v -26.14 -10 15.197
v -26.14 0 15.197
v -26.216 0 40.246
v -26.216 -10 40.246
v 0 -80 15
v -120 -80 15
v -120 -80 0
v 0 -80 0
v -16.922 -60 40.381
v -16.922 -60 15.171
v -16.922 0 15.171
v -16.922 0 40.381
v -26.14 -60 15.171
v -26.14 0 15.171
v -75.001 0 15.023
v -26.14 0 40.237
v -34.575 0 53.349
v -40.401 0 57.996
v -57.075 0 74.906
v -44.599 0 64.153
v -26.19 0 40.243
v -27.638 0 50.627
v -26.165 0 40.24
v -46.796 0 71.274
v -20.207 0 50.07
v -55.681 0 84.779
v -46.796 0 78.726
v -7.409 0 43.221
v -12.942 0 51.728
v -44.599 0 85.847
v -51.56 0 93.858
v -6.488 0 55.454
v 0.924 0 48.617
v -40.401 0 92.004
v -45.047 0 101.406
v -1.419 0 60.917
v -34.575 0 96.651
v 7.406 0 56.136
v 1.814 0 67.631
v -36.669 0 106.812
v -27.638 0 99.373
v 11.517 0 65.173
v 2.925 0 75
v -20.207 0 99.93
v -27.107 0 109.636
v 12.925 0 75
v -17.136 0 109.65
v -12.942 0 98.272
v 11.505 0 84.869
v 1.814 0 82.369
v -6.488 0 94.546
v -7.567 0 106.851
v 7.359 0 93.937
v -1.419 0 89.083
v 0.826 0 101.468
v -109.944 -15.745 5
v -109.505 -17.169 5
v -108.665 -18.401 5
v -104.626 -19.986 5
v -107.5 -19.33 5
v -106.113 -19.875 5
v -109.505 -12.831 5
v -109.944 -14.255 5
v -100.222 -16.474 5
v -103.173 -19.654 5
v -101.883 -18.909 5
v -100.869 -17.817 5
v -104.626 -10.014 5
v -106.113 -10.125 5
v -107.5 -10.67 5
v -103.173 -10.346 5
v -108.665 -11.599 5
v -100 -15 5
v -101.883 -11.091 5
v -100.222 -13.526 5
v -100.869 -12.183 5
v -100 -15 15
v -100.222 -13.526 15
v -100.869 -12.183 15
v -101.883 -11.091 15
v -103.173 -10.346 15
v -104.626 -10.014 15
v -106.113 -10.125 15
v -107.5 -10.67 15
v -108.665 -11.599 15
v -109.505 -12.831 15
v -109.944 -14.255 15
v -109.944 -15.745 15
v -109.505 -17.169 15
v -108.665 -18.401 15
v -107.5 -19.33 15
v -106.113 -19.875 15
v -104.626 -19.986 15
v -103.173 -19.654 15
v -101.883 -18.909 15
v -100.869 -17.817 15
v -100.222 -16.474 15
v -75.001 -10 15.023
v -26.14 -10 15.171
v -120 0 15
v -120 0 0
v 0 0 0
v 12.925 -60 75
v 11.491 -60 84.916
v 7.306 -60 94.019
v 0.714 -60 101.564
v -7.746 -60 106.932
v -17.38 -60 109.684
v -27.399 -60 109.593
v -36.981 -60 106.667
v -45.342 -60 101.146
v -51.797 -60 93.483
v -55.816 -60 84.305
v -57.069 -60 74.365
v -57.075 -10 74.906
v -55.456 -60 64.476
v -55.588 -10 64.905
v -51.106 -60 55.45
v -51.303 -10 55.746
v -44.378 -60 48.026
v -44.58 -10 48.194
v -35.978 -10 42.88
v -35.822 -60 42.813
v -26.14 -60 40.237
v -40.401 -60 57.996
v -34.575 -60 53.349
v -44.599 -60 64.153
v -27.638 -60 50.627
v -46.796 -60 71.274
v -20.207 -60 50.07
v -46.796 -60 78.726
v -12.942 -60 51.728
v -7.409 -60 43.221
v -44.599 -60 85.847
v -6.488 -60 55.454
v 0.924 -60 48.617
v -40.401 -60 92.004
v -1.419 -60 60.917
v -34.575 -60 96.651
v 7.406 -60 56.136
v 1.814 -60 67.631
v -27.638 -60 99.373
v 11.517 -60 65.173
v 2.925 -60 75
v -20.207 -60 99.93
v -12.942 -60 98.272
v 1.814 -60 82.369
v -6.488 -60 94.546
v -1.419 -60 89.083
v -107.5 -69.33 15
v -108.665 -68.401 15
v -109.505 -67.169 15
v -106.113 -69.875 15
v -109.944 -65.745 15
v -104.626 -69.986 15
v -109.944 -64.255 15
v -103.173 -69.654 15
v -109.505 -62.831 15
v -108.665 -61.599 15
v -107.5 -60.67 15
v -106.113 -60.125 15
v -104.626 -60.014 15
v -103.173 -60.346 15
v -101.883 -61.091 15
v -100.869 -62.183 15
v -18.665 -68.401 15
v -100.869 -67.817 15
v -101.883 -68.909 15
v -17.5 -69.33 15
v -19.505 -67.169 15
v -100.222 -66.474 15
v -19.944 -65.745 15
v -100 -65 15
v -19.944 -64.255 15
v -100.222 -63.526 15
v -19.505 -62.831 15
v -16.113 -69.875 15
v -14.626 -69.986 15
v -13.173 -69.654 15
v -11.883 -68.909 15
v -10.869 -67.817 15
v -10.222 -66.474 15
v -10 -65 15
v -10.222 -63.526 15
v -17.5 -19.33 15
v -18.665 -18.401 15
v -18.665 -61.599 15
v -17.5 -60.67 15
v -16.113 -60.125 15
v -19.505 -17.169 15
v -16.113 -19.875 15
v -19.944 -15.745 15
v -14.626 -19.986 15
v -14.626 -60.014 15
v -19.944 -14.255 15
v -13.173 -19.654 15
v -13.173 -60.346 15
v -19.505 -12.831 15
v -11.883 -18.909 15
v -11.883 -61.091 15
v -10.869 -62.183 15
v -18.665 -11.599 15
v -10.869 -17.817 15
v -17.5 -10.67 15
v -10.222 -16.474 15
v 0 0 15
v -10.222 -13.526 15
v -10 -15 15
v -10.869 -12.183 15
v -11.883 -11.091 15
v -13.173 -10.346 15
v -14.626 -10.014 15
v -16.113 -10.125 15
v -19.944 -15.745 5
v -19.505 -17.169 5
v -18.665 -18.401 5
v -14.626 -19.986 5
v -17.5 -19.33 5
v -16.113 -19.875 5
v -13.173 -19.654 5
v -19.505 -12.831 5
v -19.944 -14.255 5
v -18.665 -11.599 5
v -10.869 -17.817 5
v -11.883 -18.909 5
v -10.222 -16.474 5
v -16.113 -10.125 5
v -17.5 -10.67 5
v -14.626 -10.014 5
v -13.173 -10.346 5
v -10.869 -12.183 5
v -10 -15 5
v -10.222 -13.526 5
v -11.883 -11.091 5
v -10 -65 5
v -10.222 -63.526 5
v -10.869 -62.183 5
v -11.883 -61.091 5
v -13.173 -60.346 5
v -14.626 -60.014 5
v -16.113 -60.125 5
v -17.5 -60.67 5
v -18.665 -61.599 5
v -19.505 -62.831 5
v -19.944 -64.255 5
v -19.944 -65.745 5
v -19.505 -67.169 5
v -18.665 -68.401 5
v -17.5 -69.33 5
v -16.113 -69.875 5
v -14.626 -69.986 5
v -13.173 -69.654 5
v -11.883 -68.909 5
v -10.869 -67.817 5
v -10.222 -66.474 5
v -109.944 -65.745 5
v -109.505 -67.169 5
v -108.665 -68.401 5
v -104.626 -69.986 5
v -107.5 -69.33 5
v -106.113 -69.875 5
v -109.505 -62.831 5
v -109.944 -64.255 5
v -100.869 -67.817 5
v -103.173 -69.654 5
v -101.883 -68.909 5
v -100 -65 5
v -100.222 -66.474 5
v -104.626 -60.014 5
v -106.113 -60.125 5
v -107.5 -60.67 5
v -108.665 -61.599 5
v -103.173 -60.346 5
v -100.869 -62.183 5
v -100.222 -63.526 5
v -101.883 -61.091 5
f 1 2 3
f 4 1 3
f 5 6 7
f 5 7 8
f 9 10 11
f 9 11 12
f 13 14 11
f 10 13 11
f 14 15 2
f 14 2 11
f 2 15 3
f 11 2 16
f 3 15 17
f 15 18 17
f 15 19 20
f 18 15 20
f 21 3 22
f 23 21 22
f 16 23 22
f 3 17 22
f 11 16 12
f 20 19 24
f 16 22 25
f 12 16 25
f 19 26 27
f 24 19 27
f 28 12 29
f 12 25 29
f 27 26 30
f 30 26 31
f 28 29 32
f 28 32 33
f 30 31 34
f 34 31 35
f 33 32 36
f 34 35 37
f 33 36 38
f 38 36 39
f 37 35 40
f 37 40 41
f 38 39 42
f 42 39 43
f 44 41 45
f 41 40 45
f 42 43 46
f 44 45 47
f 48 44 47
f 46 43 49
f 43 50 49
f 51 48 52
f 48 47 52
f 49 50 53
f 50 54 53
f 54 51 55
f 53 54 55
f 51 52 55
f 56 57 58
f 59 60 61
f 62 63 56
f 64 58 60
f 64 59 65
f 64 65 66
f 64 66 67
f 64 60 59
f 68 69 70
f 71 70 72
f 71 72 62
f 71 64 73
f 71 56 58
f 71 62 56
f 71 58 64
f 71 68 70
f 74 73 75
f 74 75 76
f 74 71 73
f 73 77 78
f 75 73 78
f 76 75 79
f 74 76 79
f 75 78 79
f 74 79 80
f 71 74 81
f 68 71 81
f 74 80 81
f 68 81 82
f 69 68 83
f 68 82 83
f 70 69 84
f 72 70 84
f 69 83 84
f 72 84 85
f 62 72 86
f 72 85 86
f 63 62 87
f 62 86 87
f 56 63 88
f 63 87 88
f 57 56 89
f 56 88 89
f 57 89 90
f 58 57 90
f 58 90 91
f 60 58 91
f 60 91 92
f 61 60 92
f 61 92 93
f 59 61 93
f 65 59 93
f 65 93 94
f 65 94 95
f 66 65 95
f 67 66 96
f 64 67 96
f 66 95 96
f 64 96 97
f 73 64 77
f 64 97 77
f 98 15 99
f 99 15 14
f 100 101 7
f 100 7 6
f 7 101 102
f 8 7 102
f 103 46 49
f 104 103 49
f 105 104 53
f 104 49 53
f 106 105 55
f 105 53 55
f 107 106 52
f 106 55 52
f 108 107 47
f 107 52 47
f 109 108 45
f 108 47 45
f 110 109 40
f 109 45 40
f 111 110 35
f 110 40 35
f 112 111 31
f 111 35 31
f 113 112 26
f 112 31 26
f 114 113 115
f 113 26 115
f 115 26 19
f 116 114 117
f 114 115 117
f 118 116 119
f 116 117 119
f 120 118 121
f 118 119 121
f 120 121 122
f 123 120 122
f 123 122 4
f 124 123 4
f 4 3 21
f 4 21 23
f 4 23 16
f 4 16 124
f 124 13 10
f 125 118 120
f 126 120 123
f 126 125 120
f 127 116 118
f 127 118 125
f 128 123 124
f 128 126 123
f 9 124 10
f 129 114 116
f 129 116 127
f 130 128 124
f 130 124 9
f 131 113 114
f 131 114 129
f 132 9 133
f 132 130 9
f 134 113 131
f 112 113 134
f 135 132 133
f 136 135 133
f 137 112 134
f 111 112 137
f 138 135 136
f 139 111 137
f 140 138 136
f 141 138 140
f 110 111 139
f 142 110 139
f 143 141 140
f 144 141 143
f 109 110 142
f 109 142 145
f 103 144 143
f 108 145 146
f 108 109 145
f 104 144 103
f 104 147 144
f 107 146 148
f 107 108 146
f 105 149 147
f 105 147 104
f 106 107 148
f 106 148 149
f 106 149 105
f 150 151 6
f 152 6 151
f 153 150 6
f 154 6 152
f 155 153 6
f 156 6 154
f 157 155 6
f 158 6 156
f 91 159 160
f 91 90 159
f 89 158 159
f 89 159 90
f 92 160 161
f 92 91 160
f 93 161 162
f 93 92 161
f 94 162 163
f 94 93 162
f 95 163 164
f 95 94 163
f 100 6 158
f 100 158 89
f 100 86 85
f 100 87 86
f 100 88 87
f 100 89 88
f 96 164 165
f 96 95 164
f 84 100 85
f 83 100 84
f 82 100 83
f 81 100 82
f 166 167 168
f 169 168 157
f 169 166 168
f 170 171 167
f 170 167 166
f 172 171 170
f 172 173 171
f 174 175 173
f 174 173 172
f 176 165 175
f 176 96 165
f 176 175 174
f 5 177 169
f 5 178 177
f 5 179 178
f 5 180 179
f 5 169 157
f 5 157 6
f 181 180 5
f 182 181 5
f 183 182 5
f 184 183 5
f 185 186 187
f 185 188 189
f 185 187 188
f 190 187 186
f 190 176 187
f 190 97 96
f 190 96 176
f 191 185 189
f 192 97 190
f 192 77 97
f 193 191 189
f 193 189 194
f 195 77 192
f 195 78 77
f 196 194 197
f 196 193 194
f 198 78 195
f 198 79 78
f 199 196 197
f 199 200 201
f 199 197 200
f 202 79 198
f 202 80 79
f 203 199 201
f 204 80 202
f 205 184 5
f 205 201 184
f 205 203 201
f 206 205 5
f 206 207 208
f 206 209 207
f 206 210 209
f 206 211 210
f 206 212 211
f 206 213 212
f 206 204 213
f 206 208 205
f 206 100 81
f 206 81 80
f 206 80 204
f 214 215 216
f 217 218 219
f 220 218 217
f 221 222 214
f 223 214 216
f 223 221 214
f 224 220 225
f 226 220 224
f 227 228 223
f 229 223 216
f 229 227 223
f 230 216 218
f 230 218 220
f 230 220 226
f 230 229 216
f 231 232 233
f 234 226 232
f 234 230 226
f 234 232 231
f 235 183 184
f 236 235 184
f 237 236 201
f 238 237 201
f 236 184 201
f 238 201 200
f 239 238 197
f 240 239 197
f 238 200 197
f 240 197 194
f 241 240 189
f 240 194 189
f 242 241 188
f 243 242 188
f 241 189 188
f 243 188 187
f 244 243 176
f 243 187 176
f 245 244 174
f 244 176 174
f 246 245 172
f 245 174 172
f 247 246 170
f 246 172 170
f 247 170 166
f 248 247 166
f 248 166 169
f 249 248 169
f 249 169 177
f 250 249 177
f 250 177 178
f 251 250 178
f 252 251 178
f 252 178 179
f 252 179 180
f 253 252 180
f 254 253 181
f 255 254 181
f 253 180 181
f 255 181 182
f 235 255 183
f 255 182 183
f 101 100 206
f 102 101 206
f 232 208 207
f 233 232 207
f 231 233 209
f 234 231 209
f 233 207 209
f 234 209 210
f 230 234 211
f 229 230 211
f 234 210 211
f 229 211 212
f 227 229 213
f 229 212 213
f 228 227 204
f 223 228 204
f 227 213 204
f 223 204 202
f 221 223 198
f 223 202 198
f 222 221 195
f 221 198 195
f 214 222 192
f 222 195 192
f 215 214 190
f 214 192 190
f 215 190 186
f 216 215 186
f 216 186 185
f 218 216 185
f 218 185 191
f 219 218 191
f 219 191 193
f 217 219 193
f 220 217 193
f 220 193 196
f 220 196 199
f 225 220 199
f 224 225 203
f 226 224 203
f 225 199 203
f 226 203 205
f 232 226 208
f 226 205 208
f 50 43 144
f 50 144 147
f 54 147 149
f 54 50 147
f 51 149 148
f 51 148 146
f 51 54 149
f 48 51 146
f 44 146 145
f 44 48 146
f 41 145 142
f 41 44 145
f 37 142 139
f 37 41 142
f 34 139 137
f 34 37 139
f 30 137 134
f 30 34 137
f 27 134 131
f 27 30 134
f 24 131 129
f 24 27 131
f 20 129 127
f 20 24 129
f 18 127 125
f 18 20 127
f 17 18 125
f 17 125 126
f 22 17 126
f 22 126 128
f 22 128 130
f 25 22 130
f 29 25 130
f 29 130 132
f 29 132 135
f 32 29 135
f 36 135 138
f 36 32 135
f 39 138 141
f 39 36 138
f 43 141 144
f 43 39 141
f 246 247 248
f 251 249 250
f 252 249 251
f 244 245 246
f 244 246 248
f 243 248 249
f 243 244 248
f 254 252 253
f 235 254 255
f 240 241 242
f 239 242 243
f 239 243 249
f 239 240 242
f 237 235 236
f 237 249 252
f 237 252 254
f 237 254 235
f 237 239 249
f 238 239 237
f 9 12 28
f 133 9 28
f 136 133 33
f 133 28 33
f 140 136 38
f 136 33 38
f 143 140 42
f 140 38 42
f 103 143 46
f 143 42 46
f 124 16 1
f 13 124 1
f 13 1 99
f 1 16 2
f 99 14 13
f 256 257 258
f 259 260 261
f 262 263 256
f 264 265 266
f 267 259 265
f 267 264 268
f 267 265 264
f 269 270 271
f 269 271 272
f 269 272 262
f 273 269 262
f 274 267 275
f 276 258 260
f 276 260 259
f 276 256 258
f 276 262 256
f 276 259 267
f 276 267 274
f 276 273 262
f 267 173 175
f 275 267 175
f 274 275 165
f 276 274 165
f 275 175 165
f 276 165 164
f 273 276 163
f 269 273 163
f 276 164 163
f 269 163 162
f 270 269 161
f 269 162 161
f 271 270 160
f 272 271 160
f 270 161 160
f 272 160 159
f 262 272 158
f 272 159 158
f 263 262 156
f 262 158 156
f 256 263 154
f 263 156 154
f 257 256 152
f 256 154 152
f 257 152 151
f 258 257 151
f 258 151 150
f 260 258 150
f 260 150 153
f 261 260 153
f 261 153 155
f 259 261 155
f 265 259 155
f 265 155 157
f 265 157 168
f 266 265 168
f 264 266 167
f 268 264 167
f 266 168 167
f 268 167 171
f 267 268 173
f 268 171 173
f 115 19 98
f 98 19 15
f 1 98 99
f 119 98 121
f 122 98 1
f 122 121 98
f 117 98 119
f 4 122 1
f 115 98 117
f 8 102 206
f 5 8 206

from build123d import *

# Parameters (mm, degrees)
F0_W     = 120
F0_H     = 15
F1_DEPTH = 80
F2_R     = 5
F3_DEPTH = 10
F4_R     = 25
F5_DEPTH = 60
F7_DEPTH = 10


with BuildPart() as f1:
    # F0 (on Front) → F1 (new body)
    with BuildSketch(Plane.XZ):
        with Locations((-60, 7.5)):
            Rectangle(F0_W, F0_H)
    extrude(amount=F1_DEPTH)

    # F2 (on face) → F3 (cut)
    with BuildSketch(Plane.XY.offset(15)):
        with Locations((-105, -15)):
            Circle(F2_R)
        with Locations((-15, -15)):
            Circle(F2_R)
        with Locations((-105, -65)):
            Circle(F2_R)
        with Locations((-15, -65)):
            Circle(F2_R)
    extrude(amount=-F3_DEPTH, mode=Mode.SUBTRACT)


with BuildPart() as f5:
    # F4 (on Front) → F5 (new body)
    with BuildSketch(Plane.XZ):
        with BuildLine():
            ThreePointArc((-16.9221, 40.381419), (4.432936, 52.145641), (12.924857, 75))
            ThreePointArc((12.924857, 75), (-45.342428, 101.146385), (-26.13991, 40.236835))
            ThreePointArc((-26.13991, 40.236835), (-21.526224, 40.004305), (-16.9221, 40.381419))
        make_face()
        with Locations((-22.075143, 75)):
            Circle(F4_R, mode=Mode.SUBTRACT)
        with BuildLine():
            ThreePointArc((-16.9221, 40.381419), (-21.526224, 40.004305), (-26.13991, 40.236835))
            Line((-26.13991, 40.236835), (-26.13991, 15.170539))
            Line((-26.13991, 15.170539), (-16.9221, 15.170539))
            Line((-16.9221, 15.170539), (-16.9221, 40.381419))
        make_face()
    extrude(amount=F5_DEPTH)

    # F6 (on Front) → F7 (join)
    with BuildSketch(Plane.XZ):
        with BuildLine():
            ThreePointArc((-26.215766, 40.246482), (-48.200118, 51.79663), (-57.046488, 75.001359))
            Line((-57.046488, 75.001359), (-75.001463, 15.022794))
            Line((-75.001463, 15.022794), (-26.139831, 15.170758))
            Line((-26.139831, 15.170758), (-26.215766, 40.246482))
        make_face()
    extrude(amount=F7_DEPTH)


solid = Compound([f1.part, f5.part])
